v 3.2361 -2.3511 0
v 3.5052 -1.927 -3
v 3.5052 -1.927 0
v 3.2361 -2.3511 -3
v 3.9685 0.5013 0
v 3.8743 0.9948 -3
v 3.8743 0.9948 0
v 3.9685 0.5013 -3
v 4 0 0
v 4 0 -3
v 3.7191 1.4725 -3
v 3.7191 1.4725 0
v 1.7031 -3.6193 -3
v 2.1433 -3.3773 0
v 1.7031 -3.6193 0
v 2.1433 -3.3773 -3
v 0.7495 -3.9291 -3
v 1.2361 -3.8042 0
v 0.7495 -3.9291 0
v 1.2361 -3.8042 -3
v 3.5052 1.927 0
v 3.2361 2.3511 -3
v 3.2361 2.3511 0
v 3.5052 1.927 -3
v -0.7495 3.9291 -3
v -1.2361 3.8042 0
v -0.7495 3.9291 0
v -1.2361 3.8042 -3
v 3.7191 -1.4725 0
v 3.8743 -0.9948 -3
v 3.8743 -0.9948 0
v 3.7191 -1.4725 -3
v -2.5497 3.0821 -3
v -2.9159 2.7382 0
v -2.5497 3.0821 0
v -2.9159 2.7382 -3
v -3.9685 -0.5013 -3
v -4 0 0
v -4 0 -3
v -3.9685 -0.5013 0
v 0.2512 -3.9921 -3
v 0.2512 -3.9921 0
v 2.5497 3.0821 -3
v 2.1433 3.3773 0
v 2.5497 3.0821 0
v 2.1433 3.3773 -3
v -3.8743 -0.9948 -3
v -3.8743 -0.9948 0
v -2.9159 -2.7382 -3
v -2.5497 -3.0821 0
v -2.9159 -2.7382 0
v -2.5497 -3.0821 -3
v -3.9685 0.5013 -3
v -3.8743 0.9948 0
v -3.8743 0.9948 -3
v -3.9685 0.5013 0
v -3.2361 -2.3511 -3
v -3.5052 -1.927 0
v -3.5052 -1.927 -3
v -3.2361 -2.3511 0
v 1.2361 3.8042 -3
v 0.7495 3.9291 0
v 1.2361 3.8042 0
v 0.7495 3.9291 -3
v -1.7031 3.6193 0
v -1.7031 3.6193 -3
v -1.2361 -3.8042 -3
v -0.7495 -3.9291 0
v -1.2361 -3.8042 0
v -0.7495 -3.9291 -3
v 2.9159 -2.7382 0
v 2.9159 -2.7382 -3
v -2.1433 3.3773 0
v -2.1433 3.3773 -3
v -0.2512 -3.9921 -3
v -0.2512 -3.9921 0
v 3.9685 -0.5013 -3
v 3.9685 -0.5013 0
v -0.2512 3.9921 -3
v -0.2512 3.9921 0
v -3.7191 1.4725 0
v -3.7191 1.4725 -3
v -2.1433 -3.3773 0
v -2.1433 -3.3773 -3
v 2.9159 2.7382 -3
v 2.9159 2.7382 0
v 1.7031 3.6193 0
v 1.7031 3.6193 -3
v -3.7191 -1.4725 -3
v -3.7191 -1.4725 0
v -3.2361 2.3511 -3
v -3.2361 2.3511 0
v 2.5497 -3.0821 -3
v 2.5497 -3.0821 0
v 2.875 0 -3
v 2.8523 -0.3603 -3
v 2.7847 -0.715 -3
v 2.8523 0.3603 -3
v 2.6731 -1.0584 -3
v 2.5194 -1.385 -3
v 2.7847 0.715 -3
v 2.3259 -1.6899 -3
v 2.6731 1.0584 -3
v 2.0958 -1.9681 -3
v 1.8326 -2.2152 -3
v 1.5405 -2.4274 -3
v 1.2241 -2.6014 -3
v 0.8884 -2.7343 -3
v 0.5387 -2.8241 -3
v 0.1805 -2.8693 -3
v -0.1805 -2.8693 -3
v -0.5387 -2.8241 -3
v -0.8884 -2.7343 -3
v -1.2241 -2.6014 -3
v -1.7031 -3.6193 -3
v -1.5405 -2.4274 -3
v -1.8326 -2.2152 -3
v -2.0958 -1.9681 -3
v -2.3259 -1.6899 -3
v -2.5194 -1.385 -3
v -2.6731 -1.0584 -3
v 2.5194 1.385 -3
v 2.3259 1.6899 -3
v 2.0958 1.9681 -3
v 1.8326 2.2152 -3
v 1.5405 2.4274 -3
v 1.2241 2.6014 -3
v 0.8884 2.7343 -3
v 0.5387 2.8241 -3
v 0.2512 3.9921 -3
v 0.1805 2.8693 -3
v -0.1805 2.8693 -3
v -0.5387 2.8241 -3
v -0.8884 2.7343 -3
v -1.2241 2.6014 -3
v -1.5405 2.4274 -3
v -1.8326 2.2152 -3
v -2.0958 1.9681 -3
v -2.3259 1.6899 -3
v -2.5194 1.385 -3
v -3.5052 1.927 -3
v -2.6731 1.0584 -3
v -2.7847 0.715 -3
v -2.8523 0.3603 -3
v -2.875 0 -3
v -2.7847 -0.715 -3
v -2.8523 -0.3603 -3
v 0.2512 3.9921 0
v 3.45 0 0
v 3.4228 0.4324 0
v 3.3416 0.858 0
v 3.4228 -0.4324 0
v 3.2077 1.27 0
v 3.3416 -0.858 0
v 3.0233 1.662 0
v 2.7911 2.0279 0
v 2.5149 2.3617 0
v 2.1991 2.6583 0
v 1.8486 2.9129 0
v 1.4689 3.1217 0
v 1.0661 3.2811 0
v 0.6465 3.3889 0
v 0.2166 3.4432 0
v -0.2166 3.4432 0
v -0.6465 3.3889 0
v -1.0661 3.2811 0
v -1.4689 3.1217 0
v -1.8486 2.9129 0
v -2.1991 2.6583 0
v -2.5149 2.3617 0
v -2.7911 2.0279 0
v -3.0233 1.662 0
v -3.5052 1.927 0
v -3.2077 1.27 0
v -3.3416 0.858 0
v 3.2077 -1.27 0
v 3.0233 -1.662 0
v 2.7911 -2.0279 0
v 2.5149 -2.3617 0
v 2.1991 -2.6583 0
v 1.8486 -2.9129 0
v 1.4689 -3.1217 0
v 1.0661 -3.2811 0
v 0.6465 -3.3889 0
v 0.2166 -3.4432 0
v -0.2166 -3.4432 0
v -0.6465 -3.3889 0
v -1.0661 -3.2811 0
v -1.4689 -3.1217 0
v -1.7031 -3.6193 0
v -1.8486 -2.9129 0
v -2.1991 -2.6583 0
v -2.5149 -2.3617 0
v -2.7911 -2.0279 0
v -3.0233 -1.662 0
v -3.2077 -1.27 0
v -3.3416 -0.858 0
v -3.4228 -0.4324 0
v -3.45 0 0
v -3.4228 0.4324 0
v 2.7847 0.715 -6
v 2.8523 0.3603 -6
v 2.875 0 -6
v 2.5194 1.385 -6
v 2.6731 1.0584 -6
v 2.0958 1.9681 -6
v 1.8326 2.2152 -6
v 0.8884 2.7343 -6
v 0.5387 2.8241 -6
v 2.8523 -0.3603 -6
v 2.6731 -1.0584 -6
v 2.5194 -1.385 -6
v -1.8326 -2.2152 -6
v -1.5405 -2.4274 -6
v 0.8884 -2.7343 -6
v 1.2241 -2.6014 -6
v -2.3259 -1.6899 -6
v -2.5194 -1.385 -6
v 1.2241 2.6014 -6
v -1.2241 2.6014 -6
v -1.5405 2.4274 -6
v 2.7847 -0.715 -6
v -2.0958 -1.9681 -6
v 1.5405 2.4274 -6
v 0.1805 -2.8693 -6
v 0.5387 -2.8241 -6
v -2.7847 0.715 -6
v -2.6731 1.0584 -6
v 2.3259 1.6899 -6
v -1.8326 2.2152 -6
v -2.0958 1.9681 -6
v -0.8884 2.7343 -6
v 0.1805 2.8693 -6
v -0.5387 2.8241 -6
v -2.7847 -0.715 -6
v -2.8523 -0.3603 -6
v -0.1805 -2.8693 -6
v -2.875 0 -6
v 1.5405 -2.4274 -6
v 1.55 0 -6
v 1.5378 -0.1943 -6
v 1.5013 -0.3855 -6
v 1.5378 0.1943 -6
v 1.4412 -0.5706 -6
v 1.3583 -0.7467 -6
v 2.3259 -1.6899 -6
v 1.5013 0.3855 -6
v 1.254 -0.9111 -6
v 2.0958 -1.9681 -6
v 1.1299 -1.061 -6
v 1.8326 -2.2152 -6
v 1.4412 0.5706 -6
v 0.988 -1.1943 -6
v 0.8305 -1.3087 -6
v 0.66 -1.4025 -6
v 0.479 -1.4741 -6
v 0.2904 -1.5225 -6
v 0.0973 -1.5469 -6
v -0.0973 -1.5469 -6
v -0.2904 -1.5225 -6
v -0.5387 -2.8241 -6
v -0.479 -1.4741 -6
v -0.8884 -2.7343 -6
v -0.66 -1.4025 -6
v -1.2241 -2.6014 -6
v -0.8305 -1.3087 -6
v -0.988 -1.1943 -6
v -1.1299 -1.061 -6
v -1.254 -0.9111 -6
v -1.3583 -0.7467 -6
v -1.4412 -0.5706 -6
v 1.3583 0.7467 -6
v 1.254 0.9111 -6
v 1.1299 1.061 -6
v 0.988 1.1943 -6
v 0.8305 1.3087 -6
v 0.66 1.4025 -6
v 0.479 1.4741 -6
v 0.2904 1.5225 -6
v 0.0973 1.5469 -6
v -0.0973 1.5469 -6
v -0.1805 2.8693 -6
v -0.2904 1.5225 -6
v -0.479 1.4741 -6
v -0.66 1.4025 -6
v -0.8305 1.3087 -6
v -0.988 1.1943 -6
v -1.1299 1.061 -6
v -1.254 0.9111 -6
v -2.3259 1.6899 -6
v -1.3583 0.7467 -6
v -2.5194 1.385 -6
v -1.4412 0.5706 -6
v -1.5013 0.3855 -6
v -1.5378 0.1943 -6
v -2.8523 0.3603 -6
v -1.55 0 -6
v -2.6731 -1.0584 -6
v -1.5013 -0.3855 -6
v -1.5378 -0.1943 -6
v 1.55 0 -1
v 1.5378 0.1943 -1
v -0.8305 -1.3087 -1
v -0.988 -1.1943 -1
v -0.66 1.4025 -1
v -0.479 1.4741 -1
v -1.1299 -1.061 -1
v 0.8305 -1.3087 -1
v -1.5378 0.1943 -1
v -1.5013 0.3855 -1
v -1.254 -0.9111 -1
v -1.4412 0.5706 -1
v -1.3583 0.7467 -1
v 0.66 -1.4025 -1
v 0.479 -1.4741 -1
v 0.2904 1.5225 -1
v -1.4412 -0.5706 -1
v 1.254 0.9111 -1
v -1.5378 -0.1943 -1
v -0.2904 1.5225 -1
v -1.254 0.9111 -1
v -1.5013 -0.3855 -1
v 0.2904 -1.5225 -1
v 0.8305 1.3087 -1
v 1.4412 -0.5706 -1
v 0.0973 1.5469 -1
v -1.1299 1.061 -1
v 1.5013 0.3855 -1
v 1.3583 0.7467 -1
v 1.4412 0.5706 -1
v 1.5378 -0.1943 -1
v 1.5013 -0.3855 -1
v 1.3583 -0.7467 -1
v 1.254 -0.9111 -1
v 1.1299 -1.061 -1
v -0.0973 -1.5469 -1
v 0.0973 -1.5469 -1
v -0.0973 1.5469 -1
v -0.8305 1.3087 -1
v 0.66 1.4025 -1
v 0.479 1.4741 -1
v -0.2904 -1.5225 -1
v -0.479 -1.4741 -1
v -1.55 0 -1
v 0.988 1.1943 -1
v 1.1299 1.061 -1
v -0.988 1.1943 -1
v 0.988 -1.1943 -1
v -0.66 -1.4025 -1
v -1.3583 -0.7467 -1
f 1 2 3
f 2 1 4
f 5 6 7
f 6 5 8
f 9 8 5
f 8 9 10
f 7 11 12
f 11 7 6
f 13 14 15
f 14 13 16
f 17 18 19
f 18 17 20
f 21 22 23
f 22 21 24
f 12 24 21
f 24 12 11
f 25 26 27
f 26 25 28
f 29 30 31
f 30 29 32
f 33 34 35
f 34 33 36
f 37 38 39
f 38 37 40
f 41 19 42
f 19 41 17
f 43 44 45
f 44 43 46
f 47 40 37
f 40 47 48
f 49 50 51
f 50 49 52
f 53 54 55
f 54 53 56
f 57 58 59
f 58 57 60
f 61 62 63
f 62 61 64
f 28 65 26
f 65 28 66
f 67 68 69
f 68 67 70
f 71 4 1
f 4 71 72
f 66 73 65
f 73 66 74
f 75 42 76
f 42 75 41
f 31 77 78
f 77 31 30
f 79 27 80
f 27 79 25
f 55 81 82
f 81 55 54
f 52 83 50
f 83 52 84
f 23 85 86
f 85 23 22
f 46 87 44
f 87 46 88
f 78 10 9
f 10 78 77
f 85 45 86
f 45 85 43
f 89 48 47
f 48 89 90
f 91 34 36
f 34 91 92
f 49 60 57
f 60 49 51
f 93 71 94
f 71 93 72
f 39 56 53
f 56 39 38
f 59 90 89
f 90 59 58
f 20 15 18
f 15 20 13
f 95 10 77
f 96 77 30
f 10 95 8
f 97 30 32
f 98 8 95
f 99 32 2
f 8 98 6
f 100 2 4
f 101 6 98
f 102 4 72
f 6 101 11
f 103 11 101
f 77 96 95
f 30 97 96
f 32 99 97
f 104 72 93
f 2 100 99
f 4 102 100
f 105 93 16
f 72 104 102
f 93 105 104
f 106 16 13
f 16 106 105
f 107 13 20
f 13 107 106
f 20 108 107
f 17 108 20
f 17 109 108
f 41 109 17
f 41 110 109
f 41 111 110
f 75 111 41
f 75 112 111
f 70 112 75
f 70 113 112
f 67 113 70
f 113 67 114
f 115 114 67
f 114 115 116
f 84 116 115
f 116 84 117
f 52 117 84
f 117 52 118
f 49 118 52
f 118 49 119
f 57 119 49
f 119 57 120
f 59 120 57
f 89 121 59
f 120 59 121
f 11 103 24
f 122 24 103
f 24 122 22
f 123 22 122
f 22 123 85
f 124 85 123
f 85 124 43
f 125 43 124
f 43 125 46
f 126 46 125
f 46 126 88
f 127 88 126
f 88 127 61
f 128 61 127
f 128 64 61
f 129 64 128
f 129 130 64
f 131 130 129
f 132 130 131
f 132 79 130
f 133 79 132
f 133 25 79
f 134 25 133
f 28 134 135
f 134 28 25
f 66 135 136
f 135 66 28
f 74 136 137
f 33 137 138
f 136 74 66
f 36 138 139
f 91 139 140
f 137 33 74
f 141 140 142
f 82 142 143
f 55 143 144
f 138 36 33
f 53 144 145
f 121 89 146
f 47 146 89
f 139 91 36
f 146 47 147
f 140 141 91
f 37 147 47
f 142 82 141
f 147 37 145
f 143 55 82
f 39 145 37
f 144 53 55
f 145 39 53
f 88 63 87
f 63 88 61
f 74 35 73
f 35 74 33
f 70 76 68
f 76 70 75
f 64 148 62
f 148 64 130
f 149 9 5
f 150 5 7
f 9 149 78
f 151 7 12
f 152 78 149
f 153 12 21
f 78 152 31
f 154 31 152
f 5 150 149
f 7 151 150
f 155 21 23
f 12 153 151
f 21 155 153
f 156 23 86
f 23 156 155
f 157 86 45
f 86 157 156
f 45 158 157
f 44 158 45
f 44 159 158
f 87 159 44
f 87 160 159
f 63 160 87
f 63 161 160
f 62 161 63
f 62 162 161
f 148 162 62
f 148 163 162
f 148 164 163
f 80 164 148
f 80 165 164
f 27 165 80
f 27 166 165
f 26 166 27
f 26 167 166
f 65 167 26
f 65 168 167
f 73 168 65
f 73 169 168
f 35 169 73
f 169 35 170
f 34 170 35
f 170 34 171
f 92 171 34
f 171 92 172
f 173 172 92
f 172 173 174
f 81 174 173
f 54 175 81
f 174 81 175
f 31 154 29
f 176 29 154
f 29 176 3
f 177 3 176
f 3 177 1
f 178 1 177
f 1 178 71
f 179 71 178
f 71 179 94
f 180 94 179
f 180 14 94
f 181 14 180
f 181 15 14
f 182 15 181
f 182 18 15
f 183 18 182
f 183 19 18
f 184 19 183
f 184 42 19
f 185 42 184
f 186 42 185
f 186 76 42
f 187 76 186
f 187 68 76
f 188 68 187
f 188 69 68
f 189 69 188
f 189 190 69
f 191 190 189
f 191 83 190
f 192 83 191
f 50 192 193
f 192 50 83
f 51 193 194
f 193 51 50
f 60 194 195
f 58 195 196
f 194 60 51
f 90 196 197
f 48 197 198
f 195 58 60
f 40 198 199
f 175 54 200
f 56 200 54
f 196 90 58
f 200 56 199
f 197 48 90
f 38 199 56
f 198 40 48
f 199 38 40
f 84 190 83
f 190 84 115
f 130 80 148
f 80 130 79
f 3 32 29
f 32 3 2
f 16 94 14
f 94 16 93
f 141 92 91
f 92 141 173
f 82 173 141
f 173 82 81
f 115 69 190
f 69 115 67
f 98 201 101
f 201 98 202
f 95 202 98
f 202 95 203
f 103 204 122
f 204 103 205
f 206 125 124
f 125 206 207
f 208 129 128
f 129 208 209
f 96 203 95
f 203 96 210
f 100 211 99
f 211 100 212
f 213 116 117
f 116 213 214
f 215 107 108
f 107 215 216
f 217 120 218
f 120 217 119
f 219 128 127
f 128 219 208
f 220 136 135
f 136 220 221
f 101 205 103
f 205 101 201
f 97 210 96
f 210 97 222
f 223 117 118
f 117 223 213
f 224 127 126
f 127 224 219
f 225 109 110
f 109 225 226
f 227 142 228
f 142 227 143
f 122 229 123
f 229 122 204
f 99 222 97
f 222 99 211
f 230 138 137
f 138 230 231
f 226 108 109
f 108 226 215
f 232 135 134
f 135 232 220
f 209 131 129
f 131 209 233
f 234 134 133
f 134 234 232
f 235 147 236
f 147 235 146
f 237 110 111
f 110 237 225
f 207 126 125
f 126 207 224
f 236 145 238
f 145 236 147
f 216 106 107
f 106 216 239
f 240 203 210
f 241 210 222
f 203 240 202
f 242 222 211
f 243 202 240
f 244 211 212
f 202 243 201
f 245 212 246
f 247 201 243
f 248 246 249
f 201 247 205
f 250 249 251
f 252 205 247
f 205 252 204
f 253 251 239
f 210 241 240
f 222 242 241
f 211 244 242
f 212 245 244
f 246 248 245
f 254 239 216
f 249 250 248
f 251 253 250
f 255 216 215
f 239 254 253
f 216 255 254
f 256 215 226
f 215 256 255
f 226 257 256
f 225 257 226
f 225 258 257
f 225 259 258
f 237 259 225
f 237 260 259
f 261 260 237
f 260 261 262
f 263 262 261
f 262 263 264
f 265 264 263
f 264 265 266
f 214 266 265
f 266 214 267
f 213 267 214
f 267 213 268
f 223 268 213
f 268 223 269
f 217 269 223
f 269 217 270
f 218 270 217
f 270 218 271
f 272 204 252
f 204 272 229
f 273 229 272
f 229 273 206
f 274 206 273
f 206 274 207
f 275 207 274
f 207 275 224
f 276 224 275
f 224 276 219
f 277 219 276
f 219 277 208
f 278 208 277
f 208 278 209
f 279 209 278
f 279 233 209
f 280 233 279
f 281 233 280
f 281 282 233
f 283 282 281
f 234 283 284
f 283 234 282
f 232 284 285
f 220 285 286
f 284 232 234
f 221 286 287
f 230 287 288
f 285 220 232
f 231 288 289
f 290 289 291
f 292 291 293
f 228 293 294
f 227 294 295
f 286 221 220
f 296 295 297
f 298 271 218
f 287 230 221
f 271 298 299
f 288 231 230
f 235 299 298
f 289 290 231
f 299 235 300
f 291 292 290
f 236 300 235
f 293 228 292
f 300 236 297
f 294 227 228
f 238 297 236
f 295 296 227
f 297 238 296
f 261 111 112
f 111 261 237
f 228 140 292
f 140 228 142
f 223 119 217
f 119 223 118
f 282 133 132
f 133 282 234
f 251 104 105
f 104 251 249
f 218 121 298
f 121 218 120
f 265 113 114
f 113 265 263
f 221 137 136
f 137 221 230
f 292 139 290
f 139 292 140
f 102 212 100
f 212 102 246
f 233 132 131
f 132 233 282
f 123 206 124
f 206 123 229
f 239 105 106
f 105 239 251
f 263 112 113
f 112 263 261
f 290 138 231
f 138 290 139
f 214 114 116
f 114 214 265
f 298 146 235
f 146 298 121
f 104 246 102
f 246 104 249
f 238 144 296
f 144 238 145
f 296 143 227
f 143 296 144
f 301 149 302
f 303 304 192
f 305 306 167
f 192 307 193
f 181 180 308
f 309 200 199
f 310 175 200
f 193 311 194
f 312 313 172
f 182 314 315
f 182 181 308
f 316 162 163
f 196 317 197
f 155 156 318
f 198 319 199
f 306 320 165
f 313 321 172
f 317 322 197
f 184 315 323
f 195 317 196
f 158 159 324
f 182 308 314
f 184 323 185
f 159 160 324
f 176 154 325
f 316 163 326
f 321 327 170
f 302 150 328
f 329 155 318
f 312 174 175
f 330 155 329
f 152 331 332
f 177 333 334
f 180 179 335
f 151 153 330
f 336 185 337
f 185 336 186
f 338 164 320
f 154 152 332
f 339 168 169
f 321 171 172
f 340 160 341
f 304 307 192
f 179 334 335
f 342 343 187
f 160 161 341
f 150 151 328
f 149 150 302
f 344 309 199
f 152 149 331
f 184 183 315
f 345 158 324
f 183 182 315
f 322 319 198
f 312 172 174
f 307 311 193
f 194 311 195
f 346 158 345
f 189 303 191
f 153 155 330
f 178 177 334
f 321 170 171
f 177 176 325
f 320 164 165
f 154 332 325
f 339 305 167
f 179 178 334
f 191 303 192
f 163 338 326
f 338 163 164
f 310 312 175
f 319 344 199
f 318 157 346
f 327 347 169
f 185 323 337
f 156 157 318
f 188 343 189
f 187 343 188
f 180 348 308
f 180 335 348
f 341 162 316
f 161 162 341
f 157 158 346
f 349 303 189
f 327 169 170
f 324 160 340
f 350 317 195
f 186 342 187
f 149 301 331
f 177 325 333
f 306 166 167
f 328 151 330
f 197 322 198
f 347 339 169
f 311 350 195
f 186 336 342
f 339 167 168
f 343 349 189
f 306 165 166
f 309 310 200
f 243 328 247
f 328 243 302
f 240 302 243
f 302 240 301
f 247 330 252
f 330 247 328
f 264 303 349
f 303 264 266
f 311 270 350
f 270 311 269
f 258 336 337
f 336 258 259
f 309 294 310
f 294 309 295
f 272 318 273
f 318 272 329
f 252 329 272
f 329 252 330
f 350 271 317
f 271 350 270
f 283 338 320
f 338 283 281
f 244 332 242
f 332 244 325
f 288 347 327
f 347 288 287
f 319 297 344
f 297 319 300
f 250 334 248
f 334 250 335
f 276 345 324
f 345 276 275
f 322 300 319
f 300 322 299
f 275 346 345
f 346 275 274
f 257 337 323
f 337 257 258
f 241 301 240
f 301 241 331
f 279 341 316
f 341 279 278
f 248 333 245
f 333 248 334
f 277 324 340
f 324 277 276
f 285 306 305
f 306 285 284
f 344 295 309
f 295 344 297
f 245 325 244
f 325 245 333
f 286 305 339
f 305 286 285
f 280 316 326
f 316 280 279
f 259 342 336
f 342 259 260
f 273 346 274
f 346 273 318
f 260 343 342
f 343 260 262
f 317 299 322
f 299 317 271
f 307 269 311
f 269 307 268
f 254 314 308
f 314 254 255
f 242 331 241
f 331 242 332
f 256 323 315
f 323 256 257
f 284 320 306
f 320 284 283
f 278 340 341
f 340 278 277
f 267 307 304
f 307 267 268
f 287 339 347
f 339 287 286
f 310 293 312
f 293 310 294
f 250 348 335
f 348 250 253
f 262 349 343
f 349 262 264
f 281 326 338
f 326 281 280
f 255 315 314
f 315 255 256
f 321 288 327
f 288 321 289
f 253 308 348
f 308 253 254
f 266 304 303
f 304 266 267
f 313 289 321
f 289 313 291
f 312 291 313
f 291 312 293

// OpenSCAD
$fn = 50;

difference() {
	union() {
		translate(v = [0, 0, -3.0]) {
			cylinder(h = 3, r = 4.0);
		}
		#translate(v = [0, 0, -6.0]) {
			cylinder(h = 6, r = 2.875);
		}
	}
	union() {
		translate(v = [0, 0, 0]) {
			rotate(a = [0, 0, 0]) {
				difference() {
					union() {
						translate(v = [0, 0, -6.0]) {
							cylinder(h = 6, r = 1.25);
						}
						translate(v = [0, 0, -1.0]) {
							cylinder(h = 1.0, r1 = 1.55, r2 = 3.45);
						}
						translate(v = [0, 0, -6.0]) {
							cylinder(h = 6, r = 1.55);
						}
						translate(v = [0, 0, -6.0]) {
							cylinder(h = 6, r = 1.25);
						}
					}
					union();
				}
			}
		}
	}
}
